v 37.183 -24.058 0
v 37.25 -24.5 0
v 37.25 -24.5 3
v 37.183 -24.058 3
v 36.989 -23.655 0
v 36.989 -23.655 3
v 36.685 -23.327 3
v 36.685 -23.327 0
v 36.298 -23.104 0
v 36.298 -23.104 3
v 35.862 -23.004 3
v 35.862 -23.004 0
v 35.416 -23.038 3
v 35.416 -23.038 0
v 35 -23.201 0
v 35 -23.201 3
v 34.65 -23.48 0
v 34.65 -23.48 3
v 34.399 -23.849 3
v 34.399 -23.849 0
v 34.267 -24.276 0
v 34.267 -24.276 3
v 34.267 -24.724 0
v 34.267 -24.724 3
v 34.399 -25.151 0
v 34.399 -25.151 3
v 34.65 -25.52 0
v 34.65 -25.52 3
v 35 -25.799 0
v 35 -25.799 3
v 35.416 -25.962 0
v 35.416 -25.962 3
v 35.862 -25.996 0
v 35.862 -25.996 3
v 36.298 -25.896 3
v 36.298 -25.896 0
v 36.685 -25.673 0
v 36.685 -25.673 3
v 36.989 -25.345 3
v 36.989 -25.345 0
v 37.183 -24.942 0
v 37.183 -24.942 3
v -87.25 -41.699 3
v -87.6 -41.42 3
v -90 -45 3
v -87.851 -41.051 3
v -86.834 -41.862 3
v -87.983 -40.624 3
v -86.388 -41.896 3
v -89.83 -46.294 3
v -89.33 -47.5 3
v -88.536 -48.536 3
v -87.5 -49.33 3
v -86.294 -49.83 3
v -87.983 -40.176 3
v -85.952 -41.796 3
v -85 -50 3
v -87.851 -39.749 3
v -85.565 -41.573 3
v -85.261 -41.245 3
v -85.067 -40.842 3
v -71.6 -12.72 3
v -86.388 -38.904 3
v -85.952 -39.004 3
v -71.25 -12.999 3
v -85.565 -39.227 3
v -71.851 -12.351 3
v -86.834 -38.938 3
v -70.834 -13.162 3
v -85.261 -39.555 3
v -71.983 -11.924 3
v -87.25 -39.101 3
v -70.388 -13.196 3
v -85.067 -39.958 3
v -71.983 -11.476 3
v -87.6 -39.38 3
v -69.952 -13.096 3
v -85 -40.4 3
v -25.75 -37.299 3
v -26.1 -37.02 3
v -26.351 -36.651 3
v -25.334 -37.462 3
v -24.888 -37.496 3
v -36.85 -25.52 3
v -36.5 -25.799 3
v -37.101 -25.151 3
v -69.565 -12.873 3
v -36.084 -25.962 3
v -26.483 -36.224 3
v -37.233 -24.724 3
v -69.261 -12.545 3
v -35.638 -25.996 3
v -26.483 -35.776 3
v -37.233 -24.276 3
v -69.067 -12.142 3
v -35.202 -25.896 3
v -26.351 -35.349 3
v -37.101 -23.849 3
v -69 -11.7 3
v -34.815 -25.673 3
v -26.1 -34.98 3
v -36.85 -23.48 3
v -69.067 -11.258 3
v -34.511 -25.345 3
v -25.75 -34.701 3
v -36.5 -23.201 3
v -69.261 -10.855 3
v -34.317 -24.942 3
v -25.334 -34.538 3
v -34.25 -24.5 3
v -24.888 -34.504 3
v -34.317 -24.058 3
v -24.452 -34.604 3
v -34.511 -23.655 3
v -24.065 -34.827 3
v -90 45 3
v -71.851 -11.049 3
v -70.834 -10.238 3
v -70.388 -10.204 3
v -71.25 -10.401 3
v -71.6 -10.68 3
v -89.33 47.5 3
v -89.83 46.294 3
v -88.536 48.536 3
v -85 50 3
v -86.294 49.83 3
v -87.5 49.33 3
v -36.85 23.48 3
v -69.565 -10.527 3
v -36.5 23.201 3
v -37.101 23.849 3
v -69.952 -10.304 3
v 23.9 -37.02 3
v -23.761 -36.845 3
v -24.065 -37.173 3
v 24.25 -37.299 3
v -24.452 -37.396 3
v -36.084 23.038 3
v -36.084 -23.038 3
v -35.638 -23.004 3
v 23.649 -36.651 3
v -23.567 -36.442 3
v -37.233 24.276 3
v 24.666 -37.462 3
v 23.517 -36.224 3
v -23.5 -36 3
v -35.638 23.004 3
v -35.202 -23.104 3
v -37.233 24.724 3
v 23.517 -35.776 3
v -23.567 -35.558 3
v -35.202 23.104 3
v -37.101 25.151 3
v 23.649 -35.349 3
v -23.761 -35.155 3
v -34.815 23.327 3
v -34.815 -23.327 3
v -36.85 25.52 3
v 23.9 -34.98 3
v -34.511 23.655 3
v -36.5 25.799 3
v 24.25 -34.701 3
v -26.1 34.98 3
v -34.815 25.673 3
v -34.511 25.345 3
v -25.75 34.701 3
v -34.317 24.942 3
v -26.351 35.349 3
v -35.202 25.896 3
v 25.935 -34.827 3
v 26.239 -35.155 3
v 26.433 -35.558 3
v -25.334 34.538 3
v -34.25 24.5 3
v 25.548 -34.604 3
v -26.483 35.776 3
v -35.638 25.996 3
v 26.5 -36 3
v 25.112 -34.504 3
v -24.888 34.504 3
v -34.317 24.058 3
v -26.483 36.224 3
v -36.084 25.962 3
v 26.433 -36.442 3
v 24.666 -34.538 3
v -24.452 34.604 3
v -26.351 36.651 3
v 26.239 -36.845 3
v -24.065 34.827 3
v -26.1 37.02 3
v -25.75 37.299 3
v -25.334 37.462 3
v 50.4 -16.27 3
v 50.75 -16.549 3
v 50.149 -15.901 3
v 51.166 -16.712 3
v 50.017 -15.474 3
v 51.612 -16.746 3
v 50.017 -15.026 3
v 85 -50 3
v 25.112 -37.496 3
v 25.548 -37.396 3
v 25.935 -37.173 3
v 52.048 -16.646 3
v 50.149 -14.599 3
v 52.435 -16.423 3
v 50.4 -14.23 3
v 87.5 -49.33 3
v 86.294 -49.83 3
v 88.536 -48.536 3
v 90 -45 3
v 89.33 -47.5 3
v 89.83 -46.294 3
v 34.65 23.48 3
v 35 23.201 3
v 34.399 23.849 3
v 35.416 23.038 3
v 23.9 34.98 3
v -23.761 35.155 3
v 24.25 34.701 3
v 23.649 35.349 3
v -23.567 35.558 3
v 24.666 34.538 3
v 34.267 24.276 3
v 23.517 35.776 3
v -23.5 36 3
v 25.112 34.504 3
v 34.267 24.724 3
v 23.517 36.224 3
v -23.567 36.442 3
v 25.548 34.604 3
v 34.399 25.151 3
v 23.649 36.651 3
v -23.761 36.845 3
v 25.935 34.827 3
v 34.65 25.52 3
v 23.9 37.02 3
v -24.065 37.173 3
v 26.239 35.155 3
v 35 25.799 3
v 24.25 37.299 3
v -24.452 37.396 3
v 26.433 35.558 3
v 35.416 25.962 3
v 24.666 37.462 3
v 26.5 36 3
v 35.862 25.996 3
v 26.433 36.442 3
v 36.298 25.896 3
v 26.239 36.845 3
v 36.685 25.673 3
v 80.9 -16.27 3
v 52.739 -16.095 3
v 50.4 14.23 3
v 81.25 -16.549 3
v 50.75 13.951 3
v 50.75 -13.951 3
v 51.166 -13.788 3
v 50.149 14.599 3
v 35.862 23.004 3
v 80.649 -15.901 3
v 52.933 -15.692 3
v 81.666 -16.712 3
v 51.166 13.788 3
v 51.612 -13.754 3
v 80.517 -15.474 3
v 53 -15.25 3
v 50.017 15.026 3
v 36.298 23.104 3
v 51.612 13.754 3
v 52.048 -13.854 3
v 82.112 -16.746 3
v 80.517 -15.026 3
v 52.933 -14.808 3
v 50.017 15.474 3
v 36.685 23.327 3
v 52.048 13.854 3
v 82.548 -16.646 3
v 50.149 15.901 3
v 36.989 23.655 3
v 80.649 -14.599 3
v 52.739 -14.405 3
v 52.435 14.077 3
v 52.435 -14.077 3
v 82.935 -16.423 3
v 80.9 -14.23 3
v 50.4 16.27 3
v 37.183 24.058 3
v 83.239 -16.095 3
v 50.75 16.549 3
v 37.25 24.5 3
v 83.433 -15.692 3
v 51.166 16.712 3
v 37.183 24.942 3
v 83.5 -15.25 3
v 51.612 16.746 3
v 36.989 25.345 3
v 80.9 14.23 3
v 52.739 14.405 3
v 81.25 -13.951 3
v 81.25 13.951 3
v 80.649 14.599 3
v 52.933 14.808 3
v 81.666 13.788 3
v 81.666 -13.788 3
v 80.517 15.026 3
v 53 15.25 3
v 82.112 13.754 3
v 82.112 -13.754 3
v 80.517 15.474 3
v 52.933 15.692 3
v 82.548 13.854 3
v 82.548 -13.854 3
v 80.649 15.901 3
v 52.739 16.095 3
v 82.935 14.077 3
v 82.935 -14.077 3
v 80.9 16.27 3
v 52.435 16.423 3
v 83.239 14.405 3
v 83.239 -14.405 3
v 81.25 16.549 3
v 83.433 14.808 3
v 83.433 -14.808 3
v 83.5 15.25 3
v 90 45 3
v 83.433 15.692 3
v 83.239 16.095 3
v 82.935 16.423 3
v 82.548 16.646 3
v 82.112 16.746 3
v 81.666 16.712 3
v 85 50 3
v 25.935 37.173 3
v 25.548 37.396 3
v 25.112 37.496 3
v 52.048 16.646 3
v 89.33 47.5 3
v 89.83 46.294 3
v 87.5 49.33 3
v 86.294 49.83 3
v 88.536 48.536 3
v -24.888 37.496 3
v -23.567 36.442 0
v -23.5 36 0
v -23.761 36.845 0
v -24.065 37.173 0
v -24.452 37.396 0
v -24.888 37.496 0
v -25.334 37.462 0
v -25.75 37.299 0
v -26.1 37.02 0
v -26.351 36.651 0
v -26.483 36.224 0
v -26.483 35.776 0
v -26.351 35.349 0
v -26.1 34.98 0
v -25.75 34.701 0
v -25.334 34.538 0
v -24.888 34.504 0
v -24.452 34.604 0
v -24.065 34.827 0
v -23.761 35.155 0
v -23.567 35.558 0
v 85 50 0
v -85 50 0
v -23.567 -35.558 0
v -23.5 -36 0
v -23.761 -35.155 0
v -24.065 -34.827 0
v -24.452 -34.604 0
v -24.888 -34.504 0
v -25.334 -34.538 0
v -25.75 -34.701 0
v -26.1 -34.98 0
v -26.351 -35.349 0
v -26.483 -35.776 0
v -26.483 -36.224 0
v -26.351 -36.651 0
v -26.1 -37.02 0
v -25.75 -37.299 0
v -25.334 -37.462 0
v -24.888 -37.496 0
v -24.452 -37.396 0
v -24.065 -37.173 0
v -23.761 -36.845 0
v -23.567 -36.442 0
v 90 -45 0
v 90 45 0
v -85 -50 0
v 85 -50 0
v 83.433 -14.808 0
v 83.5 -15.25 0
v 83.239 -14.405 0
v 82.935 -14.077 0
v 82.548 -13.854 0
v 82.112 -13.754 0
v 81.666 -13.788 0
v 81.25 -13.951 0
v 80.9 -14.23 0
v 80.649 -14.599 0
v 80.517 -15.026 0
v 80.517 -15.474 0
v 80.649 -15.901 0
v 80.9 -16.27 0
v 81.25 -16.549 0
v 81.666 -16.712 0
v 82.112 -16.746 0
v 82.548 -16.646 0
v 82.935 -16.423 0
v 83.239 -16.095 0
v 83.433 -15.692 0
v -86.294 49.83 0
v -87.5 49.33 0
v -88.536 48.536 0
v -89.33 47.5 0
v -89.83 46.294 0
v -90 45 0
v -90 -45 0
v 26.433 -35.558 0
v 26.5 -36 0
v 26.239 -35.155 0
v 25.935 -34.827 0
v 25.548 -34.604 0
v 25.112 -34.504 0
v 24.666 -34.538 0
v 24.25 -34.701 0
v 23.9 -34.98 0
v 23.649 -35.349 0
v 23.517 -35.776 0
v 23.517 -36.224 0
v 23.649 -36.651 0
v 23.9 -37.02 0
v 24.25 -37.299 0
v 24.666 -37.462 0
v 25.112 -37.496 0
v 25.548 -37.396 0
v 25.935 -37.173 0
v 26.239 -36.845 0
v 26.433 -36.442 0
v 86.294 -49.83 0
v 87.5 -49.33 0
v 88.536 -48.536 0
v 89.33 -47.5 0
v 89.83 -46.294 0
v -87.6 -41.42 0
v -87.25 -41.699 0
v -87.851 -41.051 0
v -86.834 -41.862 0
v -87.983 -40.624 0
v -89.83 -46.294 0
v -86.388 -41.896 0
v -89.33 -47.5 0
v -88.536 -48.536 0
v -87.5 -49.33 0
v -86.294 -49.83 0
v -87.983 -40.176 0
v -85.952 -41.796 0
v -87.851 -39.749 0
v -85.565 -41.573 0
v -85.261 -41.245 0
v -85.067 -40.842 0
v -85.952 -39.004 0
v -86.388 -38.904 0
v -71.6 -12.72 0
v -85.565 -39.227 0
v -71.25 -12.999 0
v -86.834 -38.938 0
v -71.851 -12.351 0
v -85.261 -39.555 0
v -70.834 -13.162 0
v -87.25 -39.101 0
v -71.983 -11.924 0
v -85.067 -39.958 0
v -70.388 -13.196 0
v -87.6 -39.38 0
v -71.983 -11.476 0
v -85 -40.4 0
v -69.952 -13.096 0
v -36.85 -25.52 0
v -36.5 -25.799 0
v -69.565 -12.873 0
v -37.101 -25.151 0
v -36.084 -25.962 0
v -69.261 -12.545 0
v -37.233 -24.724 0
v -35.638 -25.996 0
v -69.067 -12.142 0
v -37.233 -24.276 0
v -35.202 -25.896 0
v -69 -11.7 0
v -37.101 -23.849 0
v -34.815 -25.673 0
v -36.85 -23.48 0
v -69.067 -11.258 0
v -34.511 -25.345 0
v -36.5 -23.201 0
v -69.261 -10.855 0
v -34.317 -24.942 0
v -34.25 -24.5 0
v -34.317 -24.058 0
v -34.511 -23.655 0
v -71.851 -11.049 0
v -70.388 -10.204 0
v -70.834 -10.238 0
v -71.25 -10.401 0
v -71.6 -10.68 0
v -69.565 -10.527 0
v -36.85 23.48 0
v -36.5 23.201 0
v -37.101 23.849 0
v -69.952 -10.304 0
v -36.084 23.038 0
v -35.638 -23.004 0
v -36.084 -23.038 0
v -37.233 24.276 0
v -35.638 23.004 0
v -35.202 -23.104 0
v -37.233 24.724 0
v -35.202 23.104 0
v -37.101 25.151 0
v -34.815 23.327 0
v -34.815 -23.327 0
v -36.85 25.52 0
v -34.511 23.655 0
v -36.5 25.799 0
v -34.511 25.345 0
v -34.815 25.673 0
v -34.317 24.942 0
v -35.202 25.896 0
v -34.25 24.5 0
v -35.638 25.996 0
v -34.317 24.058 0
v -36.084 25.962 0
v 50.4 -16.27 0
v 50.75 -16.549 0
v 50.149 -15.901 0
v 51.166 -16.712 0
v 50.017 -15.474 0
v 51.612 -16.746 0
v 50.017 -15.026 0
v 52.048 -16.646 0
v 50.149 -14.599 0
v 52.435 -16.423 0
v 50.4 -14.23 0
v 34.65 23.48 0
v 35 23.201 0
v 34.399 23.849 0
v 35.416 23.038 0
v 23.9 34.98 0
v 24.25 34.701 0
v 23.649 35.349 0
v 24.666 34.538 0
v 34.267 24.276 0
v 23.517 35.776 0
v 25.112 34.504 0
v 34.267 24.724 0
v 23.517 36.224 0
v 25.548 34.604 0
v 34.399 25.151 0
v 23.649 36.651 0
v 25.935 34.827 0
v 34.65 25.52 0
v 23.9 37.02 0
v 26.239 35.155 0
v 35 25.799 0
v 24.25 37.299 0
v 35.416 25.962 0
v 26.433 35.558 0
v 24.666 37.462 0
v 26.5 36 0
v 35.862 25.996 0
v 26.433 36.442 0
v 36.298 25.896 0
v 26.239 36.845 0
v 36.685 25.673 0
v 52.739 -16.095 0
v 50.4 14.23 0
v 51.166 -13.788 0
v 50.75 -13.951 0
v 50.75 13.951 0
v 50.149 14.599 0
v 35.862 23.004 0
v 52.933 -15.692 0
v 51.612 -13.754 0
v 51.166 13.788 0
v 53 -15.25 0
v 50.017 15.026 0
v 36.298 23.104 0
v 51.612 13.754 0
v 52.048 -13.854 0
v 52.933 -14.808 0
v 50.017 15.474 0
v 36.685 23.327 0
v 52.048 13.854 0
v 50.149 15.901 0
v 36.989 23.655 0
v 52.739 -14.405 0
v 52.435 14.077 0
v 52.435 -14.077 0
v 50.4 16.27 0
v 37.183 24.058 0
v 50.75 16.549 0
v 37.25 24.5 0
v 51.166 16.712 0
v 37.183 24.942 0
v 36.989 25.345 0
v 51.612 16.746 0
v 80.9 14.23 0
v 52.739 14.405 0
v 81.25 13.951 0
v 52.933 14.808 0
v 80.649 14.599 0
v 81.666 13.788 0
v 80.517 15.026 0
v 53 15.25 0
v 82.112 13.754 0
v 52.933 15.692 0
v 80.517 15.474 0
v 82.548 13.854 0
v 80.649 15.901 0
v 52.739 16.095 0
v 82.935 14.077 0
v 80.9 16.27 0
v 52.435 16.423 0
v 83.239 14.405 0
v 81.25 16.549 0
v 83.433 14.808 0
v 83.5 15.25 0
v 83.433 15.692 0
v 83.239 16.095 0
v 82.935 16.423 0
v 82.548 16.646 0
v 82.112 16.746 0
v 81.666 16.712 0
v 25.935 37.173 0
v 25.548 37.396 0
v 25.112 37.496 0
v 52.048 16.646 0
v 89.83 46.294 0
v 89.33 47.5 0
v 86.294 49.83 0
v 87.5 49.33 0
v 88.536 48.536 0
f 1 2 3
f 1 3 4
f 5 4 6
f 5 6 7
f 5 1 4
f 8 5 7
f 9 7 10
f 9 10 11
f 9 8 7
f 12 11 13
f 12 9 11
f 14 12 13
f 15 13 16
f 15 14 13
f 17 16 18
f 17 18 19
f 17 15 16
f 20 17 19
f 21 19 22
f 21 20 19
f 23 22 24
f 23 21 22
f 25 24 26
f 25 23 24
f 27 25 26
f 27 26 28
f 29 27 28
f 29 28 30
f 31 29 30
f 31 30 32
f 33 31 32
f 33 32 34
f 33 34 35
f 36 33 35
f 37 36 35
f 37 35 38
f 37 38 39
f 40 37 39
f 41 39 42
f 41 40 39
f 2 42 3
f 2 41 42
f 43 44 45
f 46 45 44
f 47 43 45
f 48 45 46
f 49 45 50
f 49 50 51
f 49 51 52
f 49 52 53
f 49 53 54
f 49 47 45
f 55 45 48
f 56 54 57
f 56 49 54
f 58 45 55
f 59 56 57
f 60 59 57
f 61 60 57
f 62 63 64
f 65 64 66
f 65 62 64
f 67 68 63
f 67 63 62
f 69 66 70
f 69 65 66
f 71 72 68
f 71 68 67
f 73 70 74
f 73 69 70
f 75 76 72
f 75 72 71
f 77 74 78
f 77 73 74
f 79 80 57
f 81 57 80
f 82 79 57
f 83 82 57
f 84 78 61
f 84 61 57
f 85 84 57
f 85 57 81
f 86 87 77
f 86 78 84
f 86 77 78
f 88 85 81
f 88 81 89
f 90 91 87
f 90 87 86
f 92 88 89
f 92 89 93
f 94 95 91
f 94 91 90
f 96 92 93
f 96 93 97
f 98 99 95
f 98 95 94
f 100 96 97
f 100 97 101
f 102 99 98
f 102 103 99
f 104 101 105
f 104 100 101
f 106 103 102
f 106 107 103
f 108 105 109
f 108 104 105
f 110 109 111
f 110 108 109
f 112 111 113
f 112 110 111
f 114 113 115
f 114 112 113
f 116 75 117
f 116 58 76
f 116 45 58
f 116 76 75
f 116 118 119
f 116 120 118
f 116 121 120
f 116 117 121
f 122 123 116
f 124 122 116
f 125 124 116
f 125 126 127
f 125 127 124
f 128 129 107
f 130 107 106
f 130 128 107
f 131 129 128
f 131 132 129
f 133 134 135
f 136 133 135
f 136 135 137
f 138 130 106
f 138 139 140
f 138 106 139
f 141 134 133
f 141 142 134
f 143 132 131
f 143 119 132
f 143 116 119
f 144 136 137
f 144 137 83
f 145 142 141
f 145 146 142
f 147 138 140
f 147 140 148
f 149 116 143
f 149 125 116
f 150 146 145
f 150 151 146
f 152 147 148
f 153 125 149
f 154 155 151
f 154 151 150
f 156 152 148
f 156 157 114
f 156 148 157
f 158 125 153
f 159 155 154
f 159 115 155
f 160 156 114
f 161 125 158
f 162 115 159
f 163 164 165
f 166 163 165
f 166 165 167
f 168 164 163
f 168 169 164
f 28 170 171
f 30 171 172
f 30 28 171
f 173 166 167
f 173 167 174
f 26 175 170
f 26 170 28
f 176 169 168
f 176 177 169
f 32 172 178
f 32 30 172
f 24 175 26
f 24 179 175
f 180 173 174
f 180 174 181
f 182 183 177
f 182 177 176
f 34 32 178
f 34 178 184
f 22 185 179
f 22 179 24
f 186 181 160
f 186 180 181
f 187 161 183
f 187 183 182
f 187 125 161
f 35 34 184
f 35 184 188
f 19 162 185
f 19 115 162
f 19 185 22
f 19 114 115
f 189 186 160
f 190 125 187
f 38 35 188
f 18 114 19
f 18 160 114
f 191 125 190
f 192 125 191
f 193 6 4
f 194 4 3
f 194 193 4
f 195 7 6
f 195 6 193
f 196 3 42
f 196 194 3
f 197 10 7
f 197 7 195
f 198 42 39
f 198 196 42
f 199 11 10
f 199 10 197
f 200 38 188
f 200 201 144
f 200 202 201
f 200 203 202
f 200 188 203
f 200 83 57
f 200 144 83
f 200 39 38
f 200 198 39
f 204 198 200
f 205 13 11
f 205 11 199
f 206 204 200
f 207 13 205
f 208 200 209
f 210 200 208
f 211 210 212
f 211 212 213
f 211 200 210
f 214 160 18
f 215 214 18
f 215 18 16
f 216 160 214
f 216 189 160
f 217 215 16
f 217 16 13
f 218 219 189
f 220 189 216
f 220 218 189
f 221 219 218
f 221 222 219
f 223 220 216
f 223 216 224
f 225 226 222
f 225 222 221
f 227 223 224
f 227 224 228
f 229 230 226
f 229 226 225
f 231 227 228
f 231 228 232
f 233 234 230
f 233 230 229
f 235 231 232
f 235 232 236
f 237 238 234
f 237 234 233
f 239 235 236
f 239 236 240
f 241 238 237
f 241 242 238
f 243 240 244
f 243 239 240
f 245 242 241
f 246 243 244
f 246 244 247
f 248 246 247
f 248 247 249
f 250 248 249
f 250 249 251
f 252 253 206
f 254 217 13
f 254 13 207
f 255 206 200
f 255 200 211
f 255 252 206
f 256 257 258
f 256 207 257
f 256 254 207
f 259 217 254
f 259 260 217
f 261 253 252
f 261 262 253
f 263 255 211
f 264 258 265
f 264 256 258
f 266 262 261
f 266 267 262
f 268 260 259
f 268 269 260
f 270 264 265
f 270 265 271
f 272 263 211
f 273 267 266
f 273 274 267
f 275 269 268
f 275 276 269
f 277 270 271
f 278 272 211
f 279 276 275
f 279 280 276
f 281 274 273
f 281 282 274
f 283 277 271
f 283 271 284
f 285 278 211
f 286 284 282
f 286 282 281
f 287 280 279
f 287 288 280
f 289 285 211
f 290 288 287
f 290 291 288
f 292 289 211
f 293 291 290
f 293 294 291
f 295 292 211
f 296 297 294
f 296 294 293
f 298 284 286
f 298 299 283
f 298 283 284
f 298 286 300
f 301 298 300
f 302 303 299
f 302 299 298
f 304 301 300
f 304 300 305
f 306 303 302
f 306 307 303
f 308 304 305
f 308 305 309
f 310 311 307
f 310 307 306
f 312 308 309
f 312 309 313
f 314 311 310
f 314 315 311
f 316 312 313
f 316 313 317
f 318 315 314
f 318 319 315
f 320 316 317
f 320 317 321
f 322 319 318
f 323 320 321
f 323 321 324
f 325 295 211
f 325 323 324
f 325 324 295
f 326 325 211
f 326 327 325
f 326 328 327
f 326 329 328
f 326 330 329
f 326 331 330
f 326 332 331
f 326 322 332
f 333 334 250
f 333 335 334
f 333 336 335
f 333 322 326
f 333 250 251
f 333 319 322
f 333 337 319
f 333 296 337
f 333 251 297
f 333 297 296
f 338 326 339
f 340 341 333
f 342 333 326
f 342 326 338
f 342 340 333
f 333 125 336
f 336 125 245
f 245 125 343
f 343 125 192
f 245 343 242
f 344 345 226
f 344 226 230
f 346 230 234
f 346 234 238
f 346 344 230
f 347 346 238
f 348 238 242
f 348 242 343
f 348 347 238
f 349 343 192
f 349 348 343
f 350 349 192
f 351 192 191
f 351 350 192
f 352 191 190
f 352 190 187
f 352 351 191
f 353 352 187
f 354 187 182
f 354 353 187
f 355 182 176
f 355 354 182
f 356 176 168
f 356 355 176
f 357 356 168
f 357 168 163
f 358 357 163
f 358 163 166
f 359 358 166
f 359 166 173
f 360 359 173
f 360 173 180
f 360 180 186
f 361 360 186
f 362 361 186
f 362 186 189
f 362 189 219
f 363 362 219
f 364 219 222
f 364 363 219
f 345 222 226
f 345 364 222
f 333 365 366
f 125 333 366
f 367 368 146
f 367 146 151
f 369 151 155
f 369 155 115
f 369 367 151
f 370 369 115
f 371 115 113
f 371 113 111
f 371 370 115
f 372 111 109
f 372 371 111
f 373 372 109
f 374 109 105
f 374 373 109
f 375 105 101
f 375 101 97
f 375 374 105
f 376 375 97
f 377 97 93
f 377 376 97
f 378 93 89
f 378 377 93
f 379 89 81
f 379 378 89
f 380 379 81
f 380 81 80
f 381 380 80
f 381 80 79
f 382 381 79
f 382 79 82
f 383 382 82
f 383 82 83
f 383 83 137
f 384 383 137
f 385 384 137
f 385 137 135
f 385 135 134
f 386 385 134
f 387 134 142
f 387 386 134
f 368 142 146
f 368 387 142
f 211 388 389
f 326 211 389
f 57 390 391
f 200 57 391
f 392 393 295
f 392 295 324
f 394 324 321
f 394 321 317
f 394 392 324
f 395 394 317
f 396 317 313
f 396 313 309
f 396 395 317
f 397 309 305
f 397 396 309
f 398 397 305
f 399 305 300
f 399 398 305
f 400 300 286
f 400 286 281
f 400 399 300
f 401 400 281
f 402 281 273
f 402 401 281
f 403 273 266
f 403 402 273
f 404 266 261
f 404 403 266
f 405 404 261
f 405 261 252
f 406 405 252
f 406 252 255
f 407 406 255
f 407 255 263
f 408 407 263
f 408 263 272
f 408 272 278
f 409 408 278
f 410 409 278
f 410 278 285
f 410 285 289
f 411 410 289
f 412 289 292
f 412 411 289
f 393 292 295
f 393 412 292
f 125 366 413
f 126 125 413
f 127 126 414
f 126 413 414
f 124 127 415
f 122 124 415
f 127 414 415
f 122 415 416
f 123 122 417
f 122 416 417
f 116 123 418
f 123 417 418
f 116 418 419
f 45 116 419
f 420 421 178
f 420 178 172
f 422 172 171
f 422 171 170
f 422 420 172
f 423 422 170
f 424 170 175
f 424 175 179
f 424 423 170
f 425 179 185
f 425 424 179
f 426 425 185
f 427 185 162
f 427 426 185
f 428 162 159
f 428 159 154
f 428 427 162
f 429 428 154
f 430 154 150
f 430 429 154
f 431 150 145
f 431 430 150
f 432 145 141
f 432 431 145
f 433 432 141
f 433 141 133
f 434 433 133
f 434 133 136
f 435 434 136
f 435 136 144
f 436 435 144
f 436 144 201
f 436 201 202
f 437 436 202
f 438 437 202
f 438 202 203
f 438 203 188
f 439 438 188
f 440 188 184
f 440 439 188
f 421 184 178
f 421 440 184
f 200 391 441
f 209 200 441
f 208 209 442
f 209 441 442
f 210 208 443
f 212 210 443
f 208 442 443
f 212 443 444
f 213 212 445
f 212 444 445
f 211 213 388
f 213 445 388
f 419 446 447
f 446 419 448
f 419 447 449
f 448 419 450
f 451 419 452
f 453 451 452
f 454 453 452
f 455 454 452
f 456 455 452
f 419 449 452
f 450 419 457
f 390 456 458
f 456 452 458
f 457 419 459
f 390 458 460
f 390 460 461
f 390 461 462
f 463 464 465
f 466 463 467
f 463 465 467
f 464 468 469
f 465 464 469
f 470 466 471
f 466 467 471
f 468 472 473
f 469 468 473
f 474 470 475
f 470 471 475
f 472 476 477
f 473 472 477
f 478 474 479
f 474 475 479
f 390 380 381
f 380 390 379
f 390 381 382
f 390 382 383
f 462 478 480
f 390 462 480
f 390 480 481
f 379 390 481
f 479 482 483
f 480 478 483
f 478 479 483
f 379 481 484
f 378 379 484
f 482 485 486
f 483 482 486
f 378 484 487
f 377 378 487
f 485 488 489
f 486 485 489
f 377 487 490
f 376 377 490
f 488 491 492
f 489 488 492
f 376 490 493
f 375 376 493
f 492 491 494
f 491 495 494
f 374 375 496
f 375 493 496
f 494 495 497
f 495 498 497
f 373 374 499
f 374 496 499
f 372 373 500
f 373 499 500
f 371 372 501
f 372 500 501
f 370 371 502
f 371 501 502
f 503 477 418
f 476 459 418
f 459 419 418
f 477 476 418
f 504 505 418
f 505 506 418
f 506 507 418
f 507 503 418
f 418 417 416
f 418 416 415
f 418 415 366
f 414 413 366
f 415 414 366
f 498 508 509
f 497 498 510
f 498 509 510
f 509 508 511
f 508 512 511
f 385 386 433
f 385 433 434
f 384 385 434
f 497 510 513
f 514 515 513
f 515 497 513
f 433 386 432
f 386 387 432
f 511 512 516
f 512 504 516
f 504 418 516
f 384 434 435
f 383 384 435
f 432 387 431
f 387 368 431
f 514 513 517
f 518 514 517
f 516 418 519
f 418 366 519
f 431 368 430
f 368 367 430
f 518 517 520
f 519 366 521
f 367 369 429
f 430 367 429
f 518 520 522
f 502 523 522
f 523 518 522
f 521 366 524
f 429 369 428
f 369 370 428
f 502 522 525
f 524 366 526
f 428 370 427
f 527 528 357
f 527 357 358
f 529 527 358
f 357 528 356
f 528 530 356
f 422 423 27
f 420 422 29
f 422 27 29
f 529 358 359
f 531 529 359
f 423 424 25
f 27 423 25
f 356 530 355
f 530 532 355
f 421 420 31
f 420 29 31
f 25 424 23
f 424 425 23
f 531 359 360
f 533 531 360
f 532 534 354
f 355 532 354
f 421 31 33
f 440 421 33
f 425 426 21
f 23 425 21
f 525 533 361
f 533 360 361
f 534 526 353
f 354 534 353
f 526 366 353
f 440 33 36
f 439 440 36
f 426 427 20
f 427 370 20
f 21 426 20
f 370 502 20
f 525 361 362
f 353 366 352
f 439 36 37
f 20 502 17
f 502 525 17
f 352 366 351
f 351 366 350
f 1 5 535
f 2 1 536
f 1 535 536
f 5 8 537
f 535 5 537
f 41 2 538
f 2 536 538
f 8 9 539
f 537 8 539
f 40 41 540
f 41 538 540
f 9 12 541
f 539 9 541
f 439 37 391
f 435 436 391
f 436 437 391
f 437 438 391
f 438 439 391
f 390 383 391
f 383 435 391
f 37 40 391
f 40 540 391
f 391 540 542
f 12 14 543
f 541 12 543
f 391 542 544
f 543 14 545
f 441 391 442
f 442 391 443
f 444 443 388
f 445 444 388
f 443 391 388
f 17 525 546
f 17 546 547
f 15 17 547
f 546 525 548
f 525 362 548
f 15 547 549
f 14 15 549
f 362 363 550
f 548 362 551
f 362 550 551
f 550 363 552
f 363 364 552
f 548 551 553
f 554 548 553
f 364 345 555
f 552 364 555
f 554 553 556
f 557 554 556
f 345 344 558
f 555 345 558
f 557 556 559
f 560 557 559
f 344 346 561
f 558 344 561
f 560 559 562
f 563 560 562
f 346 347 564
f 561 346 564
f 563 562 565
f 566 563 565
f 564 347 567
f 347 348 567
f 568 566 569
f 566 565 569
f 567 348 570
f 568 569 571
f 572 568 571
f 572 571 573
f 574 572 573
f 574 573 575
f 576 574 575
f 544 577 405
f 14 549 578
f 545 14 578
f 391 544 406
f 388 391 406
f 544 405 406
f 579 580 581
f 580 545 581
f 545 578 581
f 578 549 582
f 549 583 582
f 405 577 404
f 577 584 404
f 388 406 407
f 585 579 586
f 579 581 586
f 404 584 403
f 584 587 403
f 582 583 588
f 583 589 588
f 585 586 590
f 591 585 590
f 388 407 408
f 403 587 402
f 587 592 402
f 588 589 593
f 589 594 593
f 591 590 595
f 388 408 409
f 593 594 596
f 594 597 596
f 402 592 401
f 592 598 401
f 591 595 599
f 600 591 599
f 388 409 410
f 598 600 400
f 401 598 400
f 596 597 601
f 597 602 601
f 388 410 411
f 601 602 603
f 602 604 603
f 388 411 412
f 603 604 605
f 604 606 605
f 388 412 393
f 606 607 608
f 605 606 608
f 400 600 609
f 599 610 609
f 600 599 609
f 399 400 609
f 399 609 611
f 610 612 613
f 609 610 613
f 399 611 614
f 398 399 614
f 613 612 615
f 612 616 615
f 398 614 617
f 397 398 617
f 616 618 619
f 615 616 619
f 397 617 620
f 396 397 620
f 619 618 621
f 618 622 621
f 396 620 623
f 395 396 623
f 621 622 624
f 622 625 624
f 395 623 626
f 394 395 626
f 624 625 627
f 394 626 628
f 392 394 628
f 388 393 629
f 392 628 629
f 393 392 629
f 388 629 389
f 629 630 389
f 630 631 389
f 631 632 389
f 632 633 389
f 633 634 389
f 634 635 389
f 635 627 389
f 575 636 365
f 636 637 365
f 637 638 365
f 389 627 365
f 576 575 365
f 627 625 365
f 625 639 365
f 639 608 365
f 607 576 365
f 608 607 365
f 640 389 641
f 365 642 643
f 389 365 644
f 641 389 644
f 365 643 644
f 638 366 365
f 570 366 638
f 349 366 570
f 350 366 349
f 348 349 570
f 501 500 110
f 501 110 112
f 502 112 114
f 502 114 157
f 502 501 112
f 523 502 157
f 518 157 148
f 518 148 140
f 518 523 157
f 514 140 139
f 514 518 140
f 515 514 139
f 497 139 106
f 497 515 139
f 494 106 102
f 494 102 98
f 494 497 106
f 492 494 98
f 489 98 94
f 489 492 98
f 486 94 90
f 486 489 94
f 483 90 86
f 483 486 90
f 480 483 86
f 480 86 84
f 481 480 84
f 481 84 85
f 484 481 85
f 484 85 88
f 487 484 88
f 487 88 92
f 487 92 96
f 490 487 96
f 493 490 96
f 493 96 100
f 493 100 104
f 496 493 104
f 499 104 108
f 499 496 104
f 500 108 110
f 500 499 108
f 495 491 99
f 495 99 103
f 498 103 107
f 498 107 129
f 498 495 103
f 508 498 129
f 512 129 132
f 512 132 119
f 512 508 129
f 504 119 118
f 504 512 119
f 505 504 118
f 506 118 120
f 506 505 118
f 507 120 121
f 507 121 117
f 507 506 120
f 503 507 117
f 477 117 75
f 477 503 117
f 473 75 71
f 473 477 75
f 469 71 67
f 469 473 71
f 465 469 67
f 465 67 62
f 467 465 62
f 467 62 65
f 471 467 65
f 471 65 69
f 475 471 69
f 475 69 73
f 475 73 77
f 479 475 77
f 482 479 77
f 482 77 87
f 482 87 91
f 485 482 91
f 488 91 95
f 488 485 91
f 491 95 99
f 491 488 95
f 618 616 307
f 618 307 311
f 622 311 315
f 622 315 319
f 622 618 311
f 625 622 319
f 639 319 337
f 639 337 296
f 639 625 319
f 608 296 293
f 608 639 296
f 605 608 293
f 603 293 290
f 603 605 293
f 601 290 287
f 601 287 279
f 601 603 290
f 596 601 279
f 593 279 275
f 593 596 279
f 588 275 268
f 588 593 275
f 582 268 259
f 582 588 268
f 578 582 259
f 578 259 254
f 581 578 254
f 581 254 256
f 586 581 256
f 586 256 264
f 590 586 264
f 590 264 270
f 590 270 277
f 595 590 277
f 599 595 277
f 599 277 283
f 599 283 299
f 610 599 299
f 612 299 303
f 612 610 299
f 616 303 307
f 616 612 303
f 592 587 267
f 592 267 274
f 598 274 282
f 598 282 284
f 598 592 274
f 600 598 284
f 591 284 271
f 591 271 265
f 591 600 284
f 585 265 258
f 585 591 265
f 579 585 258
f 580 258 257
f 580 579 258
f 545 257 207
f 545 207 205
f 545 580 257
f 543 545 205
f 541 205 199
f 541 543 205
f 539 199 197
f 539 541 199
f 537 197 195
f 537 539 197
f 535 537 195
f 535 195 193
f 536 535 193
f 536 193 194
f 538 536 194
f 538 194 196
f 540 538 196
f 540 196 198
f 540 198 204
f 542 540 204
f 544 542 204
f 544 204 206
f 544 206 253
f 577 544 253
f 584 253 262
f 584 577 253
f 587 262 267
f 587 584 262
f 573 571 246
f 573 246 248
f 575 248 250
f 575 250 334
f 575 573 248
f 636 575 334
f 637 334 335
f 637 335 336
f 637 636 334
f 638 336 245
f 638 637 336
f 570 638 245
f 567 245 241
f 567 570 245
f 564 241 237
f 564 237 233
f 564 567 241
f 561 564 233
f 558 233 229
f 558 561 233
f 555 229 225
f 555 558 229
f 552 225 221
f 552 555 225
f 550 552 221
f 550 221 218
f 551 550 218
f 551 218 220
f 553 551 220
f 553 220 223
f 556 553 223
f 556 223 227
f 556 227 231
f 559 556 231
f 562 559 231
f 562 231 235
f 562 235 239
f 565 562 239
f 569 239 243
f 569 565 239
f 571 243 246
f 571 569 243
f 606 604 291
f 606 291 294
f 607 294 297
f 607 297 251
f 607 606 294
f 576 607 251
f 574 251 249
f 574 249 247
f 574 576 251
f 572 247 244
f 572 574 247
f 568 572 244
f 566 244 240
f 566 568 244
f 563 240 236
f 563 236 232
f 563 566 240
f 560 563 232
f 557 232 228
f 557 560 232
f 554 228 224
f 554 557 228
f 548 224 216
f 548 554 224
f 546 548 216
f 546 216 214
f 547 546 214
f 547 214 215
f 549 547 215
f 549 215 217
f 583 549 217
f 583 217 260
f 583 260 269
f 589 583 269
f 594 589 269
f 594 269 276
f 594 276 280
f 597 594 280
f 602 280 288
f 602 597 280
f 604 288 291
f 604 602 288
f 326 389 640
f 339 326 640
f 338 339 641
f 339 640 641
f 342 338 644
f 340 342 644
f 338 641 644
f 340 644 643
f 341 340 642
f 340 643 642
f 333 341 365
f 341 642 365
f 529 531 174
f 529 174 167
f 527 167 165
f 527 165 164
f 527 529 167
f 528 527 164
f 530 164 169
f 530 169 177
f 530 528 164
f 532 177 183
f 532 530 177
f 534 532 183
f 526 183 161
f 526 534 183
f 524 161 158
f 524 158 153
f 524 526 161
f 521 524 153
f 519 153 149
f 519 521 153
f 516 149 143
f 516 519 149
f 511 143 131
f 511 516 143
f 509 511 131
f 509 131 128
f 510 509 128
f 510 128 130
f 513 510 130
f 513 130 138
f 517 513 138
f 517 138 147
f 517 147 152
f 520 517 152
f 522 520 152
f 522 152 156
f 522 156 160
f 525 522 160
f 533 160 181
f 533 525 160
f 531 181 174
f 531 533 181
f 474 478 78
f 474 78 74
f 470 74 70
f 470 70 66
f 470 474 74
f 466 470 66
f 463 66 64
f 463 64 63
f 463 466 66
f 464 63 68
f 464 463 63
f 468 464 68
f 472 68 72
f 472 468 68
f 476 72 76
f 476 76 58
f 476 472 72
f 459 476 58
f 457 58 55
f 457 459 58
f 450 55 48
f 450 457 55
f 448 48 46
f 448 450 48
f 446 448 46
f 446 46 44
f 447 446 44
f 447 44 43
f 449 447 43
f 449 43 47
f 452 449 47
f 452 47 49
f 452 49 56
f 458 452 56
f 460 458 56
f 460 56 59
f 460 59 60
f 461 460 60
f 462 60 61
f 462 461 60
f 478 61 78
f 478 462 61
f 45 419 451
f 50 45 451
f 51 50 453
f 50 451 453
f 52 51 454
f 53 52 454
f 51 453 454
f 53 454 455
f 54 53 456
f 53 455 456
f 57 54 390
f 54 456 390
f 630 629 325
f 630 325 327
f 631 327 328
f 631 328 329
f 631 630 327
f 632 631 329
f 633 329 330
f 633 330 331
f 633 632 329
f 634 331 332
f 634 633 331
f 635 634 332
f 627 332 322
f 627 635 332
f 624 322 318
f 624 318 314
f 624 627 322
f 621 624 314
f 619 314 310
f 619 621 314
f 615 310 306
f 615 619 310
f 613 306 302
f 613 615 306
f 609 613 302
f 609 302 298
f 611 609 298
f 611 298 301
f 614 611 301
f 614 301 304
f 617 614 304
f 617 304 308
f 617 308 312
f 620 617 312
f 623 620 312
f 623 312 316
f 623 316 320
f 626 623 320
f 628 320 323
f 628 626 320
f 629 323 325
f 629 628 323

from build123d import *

# Parameters (mm, degrees)
F0_R     = 1.5
F1_DEPTH = 3


with BuildPart() as f1:
    # F0 (on Top) → F1 (new body)
    with BuildSketch(Plane.XY):
        with BuildLine():
            Line((-85, -50), (85, -50))
            ThreePointArc((85, -50), (88.535534, -48.535534), (90, -45))
            Line((90, -45), (90, 45))
            ThreePointArc((90, 45), (88.535534, 48.535534), (85, 50))
            Line((85, 50), (-85, 50))
            ThreePointArc((-85, 50), (-88.535534, 48.535534), (-90, 45))
            Line((-90, 45), (-90, -45))
            ThreePointArc((-90, -45), (-88.535534, -48.535534), (-85, -50))
        make_face()
        with Locations((-86.5, -40.4)):
            Circle(F0_R, mode=Mode.SUBTRACT)
        with Locations((-25, -36)):
            Circle(F0_R, mode=Mode.SUBTRACT)
        with Locations((-70.5, -11.7)):
            Circle(F0_R, mode=Mode.SUBTRACT)
        with Locations((-35.75, -24.5)):
            Circle(F0_R, mode=Mode.SUBTRACT)
        with Locations((25, -36)):
            Circle(F0_R, mode=Mode.SUBTRACT)
        with Locations((35.75, -24.5)):
            Circle(F0_R, mode=Mode.SUBTRACT)
        with Locations((51.5, -15.25)):
            Circle(F0_R, mode=Mode.SUBTRACT)
        with Locations((82, -15.25)):
            Circle(F0_R, mode=Mode.SUBTRACT)
        with Locations((-35.75, 24.5)):
            Circle(F0_R, mode=Mode.SUBTRACT)
        with Locations((-25, 36)):
            Circle(F0_R, mode=Mode.SUBTRACT)
        with Locations((35.75, 24.5)):
            Circle(F0_R, mode=Mode.SUBTRACT)
        with Locations((51.5, 15.25)):
            Circle(F0_R, mode=Mode.SUBTRACT)
        with Locations((82, 15.25)):
            Circle(F0_R, mode=Mode.SUBTRACT)
        with Locations((25, 36)):
            Circle(F0_R, mode=Mode.SUBTRACT)
    extrude(amount=F1_DEPTH)


solid = f1.part
